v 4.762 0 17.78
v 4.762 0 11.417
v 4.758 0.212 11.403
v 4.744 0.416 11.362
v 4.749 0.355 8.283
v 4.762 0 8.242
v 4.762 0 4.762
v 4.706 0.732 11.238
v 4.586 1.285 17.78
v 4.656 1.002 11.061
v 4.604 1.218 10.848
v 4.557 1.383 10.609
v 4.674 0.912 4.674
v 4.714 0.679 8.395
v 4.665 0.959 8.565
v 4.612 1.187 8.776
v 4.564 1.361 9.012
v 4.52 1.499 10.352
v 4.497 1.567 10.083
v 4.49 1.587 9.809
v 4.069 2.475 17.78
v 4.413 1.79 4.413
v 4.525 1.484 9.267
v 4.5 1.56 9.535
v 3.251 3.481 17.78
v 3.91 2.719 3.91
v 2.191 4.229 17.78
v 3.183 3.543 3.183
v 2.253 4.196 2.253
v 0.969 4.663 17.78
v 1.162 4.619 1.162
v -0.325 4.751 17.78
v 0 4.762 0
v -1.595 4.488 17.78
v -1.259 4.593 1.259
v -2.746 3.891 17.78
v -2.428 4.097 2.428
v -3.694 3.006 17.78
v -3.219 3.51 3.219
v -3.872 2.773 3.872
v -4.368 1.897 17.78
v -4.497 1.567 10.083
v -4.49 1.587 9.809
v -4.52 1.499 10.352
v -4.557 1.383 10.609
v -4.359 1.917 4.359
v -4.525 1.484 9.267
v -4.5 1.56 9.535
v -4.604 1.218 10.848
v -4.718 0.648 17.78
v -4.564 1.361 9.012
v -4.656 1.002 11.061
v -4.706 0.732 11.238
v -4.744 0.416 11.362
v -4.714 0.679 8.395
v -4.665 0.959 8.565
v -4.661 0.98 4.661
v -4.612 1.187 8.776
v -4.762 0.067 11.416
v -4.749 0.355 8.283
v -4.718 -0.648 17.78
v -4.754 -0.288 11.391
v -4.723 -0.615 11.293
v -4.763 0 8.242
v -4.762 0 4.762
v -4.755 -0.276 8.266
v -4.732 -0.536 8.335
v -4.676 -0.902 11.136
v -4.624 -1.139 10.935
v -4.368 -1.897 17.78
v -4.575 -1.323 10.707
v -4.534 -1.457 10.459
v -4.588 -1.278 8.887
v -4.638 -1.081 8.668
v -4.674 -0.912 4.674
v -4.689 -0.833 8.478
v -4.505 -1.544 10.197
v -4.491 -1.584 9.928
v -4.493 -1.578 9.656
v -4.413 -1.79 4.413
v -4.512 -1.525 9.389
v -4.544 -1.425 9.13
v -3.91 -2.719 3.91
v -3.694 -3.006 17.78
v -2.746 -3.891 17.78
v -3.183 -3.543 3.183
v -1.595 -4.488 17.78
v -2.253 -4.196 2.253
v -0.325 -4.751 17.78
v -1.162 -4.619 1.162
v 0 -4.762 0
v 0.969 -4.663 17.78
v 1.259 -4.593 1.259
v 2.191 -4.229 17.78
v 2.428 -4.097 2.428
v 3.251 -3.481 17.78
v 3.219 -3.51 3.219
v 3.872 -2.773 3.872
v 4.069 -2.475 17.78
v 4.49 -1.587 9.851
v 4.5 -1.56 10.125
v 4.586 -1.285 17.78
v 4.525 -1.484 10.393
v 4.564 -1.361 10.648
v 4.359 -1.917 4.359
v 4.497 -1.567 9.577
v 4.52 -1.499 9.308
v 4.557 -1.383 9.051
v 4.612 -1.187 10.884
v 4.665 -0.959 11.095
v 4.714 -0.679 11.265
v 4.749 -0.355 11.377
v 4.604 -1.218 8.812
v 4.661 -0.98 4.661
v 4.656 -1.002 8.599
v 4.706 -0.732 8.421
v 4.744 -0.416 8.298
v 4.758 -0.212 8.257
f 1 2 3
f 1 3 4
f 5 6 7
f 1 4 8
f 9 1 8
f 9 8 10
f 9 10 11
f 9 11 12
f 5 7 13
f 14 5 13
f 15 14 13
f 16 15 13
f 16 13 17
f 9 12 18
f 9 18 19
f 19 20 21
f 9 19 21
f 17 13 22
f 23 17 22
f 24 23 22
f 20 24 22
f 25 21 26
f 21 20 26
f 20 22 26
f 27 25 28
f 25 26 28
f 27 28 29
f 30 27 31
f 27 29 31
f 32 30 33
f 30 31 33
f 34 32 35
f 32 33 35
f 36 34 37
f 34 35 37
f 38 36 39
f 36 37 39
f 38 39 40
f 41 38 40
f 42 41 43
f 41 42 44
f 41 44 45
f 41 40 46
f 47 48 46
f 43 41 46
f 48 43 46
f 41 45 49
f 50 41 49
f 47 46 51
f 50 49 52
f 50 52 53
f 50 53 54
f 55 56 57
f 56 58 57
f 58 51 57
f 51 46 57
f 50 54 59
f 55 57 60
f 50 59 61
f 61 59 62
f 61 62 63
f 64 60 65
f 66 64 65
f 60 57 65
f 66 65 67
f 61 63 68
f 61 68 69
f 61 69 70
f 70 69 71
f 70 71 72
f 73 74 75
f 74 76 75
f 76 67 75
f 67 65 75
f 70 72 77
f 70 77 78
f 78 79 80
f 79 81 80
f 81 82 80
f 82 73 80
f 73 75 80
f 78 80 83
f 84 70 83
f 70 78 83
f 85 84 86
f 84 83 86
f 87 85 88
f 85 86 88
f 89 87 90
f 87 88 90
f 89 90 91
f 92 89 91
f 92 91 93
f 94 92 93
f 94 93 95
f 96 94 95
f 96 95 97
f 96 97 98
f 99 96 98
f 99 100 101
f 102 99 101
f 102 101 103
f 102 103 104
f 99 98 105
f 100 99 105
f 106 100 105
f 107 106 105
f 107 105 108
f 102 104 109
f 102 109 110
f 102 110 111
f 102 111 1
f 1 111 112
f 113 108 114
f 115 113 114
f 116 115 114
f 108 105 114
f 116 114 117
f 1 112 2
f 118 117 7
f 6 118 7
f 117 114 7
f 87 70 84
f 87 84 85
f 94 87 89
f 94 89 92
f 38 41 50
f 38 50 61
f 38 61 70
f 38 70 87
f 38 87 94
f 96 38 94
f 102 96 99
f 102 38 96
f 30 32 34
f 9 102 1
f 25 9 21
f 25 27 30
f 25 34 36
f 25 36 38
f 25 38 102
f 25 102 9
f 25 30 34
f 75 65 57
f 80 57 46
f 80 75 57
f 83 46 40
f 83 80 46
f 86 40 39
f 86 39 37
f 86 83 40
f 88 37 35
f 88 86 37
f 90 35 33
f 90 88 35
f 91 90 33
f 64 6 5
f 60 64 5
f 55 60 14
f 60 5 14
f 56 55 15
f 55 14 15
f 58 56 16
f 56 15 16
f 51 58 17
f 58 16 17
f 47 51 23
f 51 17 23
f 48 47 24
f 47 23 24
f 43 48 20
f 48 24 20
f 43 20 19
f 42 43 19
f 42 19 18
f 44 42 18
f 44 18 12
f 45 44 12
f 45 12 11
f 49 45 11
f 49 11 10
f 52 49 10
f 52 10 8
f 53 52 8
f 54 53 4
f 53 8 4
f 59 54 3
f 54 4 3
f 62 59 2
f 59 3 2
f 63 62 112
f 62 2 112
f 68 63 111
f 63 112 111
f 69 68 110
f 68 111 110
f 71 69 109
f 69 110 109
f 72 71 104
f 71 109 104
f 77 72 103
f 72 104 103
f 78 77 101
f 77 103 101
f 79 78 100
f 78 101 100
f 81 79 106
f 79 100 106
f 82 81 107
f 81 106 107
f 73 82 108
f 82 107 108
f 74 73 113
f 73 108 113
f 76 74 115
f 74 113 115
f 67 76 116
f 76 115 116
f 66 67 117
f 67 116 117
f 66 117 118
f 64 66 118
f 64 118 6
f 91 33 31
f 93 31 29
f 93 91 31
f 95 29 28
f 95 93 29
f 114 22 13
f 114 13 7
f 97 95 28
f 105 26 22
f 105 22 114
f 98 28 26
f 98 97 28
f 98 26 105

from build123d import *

# Parameters (mm, degrees)
SKETCH1_R                    = 4.7625
EXTRUDE1_DEPTH               = 17.78
EXTRUDE2_DEPTH               = 20.01292225
EXTRUDE2_DEPTH_BACK          = 20.01292225
F_1_8_0_125_DIAMETER_HOLE4_D = 3.175


with BuildPart() as part:
    # Sketch1 → Extrude1 (new body)
    with BuildSketch(Plane.XY):
        Circle(SKETCH1_R)
    extrude(amount=EXTRUDE1_DEPTH)

    # Sketch2 → Extrude2 (cut, two sides: drawn at the far end of the back side and taken through both)
    with BuildSketch(Plane(origin=(0, 0, 0), x_dir=(1, 0, 0), z_dir=(0, 1, 0)).offset(-EXTRUDE2_DEPTH_BACK)):
        Polygon((0, 0), (4.7625, -4.7625), (4.7625, 1.90519665), (-4.7625, 1.90519665), (-4.7625, -4.7625), align=None)
    extrude(amount=EXTRUDE2_DEPTH + EXTRUDE2_DEPTH_BACK, mode=Mode.SUBTRACT)

    # 1/8 (0.125) Diameter Hole4 (through all)
    with Locations(Plane(origin=(-4.7625, 0, 17.78), x_dir=(0, 0, 1), z_dir=(-1, 0, 0))):
        with Locations((-7.9502, 0)):
            Hole(F_1_8_0_125_DIAMETER_HOLE4_D / 2)


solid = part.part
